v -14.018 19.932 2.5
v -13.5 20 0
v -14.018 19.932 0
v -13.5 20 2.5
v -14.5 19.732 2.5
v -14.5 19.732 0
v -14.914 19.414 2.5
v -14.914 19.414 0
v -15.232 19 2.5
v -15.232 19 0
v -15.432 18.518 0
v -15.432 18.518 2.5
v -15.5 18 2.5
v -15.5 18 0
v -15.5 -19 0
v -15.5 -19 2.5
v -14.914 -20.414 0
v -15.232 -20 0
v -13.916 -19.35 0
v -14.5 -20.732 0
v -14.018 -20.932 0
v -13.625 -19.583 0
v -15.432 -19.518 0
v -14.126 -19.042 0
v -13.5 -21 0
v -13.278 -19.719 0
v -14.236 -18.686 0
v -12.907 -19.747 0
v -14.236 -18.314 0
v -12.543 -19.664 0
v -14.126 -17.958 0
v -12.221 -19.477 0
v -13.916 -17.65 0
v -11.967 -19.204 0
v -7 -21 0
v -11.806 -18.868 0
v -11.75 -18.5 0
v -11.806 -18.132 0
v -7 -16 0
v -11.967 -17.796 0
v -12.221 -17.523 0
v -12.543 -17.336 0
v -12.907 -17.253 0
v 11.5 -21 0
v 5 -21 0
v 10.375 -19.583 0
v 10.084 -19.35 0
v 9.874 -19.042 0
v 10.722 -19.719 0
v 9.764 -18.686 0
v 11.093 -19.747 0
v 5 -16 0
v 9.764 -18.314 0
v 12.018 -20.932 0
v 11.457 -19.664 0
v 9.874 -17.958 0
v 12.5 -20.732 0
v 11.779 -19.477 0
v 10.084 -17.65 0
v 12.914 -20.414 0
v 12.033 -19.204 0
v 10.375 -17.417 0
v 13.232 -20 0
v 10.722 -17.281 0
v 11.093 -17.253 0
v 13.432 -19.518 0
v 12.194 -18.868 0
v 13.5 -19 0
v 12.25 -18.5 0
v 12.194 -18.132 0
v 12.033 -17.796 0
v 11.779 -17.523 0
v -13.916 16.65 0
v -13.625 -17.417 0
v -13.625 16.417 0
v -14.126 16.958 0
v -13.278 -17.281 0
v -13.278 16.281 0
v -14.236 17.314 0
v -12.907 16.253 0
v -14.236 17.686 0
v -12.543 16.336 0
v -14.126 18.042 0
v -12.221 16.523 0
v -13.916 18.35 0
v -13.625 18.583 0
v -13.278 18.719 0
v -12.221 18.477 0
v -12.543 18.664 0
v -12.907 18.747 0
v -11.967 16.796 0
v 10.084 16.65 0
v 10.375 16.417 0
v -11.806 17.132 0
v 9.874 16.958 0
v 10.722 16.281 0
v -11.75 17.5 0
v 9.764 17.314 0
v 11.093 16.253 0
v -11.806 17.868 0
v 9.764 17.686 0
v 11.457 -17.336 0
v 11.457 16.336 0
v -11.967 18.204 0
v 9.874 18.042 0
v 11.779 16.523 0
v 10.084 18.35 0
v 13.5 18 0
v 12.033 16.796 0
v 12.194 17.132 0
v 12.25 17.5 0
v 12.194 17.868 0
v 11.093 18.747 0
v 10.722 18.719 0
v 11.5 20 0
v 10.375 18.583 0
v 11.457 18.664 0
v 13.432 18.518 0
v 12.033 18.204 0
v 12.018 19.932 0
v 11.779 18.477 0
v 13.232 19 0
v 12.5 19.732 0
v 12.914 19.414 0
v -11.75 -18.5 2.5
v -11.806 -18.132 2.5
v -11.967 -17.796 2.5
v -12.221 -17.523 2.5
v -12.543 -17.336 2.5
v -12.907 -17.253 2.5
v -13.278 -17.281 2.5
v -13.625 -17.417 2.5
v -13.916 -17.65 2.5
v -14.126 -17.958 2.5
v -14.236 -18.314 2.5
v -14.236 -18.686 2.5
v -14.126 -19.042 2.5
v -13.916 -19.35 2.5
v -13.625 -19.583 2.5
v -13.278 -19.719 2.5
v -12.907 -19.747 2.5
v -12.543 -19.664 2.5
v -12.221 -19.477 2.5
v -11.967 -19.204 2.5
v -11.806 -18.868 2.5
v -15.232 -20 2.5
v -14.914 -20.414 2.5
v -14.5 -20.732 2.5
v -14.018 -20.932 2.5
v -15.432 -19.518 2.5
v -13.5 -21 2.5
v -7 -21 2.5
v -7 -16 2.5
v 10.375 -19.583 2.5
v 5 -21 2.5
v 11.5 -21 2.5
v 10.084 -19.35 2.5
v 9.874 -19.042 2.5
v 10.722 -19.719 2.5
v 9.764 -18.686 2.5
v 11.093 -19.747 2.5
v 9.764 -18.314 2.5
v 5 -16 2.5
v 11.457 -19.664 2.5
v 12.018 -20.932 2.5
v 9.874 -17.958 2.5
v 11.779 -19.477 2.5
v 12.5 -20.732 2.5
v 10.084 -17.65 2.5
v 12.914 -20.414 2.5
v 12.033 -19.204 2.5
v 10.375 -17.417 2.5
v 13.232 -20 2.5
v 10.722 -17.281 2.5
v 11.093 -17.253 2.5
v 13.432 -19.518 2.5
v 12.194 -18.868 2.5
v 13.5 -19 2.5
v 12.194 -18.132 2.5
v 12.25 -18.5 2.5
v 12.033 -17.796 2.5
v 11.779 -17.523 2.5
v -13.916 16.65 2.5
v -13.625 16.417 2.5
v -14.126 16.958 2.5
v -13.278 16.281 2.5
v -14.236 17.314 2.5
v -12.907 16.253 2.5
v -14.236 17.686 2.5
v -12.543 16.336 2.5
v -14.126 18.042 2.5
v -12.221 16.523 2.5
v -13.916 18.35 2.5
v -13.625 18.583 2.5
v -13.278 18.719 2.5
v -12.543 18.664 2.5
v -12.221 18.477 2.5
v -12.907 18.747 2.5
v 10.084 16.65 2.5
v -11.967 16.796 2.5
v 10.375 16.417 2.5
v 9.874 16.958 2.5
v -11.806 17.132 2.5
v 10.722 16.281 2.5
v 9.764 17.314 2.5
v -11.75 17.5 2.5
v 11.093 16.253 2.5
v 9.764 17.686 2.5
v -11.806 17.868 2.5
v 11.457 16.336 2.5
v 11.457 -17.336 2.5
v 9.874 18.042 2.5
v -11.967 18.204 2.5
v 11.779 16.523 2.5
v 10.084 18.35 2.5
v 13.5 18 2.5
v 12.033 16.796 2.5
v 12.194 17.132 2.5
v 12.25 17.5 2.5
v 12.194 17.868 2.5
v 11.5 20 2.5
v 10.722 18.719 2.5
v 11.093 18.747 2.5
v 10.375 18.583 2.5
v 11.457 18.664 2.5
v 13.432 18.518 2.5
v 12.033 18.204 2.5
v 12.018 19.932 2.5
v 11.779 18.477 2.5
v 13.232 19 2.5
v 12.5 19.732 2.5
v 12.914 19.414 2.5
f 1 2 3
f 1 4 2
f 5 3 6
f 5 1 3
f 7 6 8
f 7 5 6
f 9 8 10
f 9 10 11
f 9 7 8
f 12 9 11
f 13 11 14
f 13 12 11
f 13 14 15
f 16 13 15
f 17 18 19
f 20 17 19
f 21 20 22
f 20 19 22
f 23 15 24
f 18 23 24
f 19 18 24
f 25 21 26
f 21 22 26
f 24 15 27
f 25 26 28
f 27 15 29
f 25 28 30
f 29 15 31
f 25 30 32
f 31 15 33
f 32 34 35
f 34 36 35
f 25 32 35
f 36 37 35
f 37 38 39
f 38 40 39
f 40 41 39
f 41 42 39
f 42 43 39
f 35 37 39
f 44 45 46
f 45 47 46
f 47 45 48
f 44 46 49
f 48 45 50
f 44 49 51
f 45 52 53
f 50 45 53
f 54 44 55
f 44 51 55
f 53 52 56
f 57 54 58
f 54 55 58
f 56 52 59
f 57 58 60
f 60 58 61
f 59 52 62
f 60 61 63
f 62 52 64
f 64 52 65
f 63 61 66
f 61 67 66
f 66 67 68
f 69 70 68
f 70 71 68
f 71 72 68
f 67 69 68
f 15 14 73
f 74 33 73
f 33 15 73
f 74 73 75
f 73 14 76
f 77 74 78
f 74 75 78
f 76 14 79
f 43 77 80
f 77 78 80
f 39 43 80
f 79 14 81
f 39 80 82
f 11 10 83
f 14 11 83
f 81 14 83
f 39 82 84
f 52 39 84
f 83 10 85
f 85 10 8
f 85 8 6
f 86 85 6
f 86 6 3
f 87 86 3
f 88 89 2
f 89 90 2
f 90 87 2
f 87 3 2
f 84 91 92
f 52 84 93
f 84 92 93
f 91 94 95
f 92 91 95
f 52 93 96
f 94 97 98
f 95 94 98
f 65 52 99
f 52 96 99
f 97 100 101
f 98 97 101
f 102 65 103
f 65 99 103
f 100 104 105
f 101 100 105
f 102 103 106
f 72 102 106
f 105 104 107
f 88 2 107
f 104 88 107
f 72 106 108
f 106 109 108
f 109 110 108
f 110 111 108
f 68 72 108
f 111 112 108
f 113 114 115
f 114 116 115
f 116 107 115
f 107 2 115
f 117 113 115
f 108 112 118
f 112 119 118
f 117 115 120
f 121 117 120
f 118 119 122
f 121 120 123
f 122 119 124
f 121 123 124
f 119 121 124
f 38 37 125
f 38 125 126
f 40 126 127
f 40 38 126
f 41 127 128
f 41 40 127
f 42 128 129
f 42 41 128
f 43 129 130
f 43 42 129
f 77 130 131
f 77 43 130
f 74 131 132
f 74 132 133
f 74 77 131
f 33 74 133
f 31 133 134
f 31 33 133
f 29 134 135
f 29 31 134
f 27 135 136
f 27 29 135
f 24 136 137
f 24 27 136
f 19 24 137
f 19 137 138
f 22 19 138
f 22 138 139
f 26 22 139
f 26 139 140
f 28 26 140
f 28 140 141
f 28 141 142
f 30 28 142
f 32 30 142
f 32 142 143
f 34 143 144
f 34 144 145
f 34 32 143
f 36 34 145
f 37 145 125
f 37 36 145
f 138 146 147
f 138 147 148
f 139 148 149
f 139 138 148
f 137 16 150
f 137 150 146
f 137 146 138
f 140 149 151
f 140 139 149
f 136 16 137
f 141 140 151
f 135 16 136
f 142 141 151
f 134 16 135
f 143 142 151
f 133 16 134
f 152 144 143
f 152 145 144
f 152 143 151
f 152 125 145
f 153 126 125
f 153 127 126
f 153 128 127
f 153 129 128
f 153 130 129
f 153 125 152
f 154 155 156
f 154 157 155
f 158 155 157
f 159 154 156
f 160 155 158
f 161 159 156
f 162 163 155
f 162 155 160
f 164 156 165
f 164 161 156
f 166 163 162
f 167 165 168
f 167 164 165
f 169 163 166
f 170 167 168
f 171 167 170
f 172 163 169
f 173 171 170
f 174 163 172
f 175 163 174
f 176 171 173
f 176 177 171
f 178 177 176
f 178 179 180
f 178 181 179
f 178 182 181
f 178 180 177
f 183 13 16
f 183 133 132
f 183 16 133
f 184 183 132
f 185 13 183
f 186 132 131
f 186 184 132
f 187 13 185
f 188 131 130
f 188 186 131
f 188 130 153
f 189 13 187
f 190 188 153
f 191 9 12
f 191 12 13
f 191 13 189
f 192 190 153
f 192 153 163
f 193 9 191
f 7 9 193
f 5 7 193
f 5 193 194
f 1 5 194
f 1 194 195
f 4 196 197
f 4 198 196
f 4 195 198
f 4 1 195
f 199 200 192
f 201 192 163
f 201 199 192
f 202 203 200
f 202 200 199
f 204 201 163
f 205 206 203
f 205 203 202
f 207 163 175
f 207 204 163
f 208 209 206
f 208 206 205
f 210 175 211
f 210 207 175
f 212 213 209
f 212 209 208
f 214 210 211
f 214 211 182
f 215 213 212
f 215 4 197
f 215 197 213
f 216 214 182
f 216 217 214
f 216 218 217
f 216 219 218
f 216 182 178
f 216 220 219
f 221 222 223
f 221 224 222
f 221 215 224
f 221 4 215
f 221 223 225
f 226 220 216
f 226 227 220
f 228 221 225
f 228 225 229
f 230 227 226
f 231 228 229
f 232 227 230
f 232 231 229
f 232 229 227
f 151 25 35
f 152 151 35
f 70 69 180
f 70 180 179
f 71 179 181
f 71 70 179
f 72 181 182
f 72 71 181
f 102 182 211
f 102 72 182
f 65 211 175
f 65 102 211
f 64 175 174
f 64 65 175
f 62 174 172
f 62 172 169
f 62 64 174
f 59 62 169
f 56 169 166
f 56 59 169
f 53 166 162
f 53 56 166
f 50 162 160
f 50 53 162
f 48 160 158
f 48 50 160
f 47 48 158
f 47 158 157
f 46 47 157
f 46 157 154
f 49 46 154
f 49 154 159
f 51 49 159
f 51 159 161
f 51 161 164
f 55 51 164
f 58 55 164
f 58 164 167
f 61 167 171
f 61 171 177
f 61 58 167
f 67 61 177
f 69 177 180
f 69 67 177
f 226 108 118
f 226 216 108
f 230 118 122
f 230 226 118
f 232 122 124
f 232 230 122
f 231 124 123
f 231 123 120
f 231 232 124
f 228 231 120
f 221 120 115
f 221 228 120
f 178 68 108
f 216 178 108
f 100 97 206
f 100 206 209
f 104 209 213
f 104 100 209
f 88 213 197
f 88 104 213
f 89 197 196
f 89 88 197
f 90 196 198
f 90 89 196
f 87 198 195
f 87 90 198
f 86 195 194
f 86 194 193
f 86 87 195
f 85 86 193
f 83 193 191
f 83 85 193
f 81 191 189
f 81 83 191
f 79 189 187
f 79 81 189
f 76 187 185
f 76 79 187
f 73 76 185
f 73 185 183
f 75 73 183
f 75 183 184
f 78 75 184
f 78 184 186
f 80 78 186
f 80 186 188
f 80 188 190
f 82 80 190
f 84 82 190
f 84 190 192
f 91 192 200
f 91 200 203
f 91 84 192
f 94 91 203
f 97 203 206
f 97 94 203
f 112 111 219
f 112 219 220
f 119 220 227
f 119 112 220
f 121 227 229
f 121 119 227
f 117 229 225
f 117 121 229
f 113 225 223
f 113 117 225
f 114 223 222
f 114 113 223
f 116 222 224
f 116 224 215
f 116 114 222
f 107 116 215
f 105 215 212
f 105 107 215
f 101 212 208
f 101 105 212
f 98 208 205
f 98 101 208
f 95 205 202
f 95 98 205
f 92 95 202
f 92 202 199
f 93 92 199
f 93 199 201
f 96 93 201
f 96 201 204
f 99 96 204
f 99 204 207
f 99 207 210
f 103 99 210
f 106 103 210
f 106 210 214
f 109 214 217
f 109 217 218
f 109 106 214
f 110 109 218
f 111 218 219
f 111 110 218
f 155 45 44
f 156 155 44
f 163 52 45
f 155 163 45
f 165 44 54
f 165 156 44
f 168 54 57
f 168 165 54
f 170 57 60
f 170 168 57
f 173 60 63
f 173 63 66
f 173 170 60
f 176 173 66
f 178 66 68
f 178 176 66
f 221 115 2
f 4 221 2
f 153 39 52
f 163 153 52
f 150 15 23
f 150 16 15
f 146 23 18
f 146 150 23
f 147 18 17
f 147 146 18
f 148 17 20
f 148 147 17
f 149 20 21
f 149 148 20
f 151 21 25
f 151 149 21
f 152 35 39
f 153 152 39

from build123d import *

# Parameters (mm, degrees)
F0_R     = 1.25
F1_DEPTH = 2.5
F2_R     = 2


with BuildPart() as f1:
    # F0 (on Top) → F1 (new body)
    with BuildSketch(Plane.XY):
        Polygon((8.5, 15), (8.5, -16), (5, -16), (5, -21), (13.5, -21), (13.5, 20), (-15.5, 20), (-15.5, -21), (-7, -21), (-7, -16), (-10.5, -16), (-10.5, 15), align=None)
        with Locations((-13, -18.5)):
            Circle(F0_R, mode=Mode.SUBTRACT)
        with Locations((11, -18.5)):
            Circle(F0_R, mode=Mode.SUBTRACT)
        with Locations((-13, 17.5)):
            Circle(F0_R, mode=Mode.SUBTRACT)
        with Locations((11, 17.5)):
            Circle(F0_R, mode=Mode.SUBTRACT)
        Polygon((5, -16), (8.5, -16), (8.5, 15), (-10.5, 15), (-10.5, -16), (-7, -16), align=None)
    extrude(amount=F1_DEPTH)

    # F2
    f2_edges = [f1.edges().sort_by_distance(p)[0] for p in [
        (-15.5, 20, 1.25),
        (13.5, 20, 1.25),
        (13.5, -21, 1.25),
        (-15.5, -21, 1.25),
    ]]
    fillet(f2_edges, radius=F2_R)


solid = f1.part
